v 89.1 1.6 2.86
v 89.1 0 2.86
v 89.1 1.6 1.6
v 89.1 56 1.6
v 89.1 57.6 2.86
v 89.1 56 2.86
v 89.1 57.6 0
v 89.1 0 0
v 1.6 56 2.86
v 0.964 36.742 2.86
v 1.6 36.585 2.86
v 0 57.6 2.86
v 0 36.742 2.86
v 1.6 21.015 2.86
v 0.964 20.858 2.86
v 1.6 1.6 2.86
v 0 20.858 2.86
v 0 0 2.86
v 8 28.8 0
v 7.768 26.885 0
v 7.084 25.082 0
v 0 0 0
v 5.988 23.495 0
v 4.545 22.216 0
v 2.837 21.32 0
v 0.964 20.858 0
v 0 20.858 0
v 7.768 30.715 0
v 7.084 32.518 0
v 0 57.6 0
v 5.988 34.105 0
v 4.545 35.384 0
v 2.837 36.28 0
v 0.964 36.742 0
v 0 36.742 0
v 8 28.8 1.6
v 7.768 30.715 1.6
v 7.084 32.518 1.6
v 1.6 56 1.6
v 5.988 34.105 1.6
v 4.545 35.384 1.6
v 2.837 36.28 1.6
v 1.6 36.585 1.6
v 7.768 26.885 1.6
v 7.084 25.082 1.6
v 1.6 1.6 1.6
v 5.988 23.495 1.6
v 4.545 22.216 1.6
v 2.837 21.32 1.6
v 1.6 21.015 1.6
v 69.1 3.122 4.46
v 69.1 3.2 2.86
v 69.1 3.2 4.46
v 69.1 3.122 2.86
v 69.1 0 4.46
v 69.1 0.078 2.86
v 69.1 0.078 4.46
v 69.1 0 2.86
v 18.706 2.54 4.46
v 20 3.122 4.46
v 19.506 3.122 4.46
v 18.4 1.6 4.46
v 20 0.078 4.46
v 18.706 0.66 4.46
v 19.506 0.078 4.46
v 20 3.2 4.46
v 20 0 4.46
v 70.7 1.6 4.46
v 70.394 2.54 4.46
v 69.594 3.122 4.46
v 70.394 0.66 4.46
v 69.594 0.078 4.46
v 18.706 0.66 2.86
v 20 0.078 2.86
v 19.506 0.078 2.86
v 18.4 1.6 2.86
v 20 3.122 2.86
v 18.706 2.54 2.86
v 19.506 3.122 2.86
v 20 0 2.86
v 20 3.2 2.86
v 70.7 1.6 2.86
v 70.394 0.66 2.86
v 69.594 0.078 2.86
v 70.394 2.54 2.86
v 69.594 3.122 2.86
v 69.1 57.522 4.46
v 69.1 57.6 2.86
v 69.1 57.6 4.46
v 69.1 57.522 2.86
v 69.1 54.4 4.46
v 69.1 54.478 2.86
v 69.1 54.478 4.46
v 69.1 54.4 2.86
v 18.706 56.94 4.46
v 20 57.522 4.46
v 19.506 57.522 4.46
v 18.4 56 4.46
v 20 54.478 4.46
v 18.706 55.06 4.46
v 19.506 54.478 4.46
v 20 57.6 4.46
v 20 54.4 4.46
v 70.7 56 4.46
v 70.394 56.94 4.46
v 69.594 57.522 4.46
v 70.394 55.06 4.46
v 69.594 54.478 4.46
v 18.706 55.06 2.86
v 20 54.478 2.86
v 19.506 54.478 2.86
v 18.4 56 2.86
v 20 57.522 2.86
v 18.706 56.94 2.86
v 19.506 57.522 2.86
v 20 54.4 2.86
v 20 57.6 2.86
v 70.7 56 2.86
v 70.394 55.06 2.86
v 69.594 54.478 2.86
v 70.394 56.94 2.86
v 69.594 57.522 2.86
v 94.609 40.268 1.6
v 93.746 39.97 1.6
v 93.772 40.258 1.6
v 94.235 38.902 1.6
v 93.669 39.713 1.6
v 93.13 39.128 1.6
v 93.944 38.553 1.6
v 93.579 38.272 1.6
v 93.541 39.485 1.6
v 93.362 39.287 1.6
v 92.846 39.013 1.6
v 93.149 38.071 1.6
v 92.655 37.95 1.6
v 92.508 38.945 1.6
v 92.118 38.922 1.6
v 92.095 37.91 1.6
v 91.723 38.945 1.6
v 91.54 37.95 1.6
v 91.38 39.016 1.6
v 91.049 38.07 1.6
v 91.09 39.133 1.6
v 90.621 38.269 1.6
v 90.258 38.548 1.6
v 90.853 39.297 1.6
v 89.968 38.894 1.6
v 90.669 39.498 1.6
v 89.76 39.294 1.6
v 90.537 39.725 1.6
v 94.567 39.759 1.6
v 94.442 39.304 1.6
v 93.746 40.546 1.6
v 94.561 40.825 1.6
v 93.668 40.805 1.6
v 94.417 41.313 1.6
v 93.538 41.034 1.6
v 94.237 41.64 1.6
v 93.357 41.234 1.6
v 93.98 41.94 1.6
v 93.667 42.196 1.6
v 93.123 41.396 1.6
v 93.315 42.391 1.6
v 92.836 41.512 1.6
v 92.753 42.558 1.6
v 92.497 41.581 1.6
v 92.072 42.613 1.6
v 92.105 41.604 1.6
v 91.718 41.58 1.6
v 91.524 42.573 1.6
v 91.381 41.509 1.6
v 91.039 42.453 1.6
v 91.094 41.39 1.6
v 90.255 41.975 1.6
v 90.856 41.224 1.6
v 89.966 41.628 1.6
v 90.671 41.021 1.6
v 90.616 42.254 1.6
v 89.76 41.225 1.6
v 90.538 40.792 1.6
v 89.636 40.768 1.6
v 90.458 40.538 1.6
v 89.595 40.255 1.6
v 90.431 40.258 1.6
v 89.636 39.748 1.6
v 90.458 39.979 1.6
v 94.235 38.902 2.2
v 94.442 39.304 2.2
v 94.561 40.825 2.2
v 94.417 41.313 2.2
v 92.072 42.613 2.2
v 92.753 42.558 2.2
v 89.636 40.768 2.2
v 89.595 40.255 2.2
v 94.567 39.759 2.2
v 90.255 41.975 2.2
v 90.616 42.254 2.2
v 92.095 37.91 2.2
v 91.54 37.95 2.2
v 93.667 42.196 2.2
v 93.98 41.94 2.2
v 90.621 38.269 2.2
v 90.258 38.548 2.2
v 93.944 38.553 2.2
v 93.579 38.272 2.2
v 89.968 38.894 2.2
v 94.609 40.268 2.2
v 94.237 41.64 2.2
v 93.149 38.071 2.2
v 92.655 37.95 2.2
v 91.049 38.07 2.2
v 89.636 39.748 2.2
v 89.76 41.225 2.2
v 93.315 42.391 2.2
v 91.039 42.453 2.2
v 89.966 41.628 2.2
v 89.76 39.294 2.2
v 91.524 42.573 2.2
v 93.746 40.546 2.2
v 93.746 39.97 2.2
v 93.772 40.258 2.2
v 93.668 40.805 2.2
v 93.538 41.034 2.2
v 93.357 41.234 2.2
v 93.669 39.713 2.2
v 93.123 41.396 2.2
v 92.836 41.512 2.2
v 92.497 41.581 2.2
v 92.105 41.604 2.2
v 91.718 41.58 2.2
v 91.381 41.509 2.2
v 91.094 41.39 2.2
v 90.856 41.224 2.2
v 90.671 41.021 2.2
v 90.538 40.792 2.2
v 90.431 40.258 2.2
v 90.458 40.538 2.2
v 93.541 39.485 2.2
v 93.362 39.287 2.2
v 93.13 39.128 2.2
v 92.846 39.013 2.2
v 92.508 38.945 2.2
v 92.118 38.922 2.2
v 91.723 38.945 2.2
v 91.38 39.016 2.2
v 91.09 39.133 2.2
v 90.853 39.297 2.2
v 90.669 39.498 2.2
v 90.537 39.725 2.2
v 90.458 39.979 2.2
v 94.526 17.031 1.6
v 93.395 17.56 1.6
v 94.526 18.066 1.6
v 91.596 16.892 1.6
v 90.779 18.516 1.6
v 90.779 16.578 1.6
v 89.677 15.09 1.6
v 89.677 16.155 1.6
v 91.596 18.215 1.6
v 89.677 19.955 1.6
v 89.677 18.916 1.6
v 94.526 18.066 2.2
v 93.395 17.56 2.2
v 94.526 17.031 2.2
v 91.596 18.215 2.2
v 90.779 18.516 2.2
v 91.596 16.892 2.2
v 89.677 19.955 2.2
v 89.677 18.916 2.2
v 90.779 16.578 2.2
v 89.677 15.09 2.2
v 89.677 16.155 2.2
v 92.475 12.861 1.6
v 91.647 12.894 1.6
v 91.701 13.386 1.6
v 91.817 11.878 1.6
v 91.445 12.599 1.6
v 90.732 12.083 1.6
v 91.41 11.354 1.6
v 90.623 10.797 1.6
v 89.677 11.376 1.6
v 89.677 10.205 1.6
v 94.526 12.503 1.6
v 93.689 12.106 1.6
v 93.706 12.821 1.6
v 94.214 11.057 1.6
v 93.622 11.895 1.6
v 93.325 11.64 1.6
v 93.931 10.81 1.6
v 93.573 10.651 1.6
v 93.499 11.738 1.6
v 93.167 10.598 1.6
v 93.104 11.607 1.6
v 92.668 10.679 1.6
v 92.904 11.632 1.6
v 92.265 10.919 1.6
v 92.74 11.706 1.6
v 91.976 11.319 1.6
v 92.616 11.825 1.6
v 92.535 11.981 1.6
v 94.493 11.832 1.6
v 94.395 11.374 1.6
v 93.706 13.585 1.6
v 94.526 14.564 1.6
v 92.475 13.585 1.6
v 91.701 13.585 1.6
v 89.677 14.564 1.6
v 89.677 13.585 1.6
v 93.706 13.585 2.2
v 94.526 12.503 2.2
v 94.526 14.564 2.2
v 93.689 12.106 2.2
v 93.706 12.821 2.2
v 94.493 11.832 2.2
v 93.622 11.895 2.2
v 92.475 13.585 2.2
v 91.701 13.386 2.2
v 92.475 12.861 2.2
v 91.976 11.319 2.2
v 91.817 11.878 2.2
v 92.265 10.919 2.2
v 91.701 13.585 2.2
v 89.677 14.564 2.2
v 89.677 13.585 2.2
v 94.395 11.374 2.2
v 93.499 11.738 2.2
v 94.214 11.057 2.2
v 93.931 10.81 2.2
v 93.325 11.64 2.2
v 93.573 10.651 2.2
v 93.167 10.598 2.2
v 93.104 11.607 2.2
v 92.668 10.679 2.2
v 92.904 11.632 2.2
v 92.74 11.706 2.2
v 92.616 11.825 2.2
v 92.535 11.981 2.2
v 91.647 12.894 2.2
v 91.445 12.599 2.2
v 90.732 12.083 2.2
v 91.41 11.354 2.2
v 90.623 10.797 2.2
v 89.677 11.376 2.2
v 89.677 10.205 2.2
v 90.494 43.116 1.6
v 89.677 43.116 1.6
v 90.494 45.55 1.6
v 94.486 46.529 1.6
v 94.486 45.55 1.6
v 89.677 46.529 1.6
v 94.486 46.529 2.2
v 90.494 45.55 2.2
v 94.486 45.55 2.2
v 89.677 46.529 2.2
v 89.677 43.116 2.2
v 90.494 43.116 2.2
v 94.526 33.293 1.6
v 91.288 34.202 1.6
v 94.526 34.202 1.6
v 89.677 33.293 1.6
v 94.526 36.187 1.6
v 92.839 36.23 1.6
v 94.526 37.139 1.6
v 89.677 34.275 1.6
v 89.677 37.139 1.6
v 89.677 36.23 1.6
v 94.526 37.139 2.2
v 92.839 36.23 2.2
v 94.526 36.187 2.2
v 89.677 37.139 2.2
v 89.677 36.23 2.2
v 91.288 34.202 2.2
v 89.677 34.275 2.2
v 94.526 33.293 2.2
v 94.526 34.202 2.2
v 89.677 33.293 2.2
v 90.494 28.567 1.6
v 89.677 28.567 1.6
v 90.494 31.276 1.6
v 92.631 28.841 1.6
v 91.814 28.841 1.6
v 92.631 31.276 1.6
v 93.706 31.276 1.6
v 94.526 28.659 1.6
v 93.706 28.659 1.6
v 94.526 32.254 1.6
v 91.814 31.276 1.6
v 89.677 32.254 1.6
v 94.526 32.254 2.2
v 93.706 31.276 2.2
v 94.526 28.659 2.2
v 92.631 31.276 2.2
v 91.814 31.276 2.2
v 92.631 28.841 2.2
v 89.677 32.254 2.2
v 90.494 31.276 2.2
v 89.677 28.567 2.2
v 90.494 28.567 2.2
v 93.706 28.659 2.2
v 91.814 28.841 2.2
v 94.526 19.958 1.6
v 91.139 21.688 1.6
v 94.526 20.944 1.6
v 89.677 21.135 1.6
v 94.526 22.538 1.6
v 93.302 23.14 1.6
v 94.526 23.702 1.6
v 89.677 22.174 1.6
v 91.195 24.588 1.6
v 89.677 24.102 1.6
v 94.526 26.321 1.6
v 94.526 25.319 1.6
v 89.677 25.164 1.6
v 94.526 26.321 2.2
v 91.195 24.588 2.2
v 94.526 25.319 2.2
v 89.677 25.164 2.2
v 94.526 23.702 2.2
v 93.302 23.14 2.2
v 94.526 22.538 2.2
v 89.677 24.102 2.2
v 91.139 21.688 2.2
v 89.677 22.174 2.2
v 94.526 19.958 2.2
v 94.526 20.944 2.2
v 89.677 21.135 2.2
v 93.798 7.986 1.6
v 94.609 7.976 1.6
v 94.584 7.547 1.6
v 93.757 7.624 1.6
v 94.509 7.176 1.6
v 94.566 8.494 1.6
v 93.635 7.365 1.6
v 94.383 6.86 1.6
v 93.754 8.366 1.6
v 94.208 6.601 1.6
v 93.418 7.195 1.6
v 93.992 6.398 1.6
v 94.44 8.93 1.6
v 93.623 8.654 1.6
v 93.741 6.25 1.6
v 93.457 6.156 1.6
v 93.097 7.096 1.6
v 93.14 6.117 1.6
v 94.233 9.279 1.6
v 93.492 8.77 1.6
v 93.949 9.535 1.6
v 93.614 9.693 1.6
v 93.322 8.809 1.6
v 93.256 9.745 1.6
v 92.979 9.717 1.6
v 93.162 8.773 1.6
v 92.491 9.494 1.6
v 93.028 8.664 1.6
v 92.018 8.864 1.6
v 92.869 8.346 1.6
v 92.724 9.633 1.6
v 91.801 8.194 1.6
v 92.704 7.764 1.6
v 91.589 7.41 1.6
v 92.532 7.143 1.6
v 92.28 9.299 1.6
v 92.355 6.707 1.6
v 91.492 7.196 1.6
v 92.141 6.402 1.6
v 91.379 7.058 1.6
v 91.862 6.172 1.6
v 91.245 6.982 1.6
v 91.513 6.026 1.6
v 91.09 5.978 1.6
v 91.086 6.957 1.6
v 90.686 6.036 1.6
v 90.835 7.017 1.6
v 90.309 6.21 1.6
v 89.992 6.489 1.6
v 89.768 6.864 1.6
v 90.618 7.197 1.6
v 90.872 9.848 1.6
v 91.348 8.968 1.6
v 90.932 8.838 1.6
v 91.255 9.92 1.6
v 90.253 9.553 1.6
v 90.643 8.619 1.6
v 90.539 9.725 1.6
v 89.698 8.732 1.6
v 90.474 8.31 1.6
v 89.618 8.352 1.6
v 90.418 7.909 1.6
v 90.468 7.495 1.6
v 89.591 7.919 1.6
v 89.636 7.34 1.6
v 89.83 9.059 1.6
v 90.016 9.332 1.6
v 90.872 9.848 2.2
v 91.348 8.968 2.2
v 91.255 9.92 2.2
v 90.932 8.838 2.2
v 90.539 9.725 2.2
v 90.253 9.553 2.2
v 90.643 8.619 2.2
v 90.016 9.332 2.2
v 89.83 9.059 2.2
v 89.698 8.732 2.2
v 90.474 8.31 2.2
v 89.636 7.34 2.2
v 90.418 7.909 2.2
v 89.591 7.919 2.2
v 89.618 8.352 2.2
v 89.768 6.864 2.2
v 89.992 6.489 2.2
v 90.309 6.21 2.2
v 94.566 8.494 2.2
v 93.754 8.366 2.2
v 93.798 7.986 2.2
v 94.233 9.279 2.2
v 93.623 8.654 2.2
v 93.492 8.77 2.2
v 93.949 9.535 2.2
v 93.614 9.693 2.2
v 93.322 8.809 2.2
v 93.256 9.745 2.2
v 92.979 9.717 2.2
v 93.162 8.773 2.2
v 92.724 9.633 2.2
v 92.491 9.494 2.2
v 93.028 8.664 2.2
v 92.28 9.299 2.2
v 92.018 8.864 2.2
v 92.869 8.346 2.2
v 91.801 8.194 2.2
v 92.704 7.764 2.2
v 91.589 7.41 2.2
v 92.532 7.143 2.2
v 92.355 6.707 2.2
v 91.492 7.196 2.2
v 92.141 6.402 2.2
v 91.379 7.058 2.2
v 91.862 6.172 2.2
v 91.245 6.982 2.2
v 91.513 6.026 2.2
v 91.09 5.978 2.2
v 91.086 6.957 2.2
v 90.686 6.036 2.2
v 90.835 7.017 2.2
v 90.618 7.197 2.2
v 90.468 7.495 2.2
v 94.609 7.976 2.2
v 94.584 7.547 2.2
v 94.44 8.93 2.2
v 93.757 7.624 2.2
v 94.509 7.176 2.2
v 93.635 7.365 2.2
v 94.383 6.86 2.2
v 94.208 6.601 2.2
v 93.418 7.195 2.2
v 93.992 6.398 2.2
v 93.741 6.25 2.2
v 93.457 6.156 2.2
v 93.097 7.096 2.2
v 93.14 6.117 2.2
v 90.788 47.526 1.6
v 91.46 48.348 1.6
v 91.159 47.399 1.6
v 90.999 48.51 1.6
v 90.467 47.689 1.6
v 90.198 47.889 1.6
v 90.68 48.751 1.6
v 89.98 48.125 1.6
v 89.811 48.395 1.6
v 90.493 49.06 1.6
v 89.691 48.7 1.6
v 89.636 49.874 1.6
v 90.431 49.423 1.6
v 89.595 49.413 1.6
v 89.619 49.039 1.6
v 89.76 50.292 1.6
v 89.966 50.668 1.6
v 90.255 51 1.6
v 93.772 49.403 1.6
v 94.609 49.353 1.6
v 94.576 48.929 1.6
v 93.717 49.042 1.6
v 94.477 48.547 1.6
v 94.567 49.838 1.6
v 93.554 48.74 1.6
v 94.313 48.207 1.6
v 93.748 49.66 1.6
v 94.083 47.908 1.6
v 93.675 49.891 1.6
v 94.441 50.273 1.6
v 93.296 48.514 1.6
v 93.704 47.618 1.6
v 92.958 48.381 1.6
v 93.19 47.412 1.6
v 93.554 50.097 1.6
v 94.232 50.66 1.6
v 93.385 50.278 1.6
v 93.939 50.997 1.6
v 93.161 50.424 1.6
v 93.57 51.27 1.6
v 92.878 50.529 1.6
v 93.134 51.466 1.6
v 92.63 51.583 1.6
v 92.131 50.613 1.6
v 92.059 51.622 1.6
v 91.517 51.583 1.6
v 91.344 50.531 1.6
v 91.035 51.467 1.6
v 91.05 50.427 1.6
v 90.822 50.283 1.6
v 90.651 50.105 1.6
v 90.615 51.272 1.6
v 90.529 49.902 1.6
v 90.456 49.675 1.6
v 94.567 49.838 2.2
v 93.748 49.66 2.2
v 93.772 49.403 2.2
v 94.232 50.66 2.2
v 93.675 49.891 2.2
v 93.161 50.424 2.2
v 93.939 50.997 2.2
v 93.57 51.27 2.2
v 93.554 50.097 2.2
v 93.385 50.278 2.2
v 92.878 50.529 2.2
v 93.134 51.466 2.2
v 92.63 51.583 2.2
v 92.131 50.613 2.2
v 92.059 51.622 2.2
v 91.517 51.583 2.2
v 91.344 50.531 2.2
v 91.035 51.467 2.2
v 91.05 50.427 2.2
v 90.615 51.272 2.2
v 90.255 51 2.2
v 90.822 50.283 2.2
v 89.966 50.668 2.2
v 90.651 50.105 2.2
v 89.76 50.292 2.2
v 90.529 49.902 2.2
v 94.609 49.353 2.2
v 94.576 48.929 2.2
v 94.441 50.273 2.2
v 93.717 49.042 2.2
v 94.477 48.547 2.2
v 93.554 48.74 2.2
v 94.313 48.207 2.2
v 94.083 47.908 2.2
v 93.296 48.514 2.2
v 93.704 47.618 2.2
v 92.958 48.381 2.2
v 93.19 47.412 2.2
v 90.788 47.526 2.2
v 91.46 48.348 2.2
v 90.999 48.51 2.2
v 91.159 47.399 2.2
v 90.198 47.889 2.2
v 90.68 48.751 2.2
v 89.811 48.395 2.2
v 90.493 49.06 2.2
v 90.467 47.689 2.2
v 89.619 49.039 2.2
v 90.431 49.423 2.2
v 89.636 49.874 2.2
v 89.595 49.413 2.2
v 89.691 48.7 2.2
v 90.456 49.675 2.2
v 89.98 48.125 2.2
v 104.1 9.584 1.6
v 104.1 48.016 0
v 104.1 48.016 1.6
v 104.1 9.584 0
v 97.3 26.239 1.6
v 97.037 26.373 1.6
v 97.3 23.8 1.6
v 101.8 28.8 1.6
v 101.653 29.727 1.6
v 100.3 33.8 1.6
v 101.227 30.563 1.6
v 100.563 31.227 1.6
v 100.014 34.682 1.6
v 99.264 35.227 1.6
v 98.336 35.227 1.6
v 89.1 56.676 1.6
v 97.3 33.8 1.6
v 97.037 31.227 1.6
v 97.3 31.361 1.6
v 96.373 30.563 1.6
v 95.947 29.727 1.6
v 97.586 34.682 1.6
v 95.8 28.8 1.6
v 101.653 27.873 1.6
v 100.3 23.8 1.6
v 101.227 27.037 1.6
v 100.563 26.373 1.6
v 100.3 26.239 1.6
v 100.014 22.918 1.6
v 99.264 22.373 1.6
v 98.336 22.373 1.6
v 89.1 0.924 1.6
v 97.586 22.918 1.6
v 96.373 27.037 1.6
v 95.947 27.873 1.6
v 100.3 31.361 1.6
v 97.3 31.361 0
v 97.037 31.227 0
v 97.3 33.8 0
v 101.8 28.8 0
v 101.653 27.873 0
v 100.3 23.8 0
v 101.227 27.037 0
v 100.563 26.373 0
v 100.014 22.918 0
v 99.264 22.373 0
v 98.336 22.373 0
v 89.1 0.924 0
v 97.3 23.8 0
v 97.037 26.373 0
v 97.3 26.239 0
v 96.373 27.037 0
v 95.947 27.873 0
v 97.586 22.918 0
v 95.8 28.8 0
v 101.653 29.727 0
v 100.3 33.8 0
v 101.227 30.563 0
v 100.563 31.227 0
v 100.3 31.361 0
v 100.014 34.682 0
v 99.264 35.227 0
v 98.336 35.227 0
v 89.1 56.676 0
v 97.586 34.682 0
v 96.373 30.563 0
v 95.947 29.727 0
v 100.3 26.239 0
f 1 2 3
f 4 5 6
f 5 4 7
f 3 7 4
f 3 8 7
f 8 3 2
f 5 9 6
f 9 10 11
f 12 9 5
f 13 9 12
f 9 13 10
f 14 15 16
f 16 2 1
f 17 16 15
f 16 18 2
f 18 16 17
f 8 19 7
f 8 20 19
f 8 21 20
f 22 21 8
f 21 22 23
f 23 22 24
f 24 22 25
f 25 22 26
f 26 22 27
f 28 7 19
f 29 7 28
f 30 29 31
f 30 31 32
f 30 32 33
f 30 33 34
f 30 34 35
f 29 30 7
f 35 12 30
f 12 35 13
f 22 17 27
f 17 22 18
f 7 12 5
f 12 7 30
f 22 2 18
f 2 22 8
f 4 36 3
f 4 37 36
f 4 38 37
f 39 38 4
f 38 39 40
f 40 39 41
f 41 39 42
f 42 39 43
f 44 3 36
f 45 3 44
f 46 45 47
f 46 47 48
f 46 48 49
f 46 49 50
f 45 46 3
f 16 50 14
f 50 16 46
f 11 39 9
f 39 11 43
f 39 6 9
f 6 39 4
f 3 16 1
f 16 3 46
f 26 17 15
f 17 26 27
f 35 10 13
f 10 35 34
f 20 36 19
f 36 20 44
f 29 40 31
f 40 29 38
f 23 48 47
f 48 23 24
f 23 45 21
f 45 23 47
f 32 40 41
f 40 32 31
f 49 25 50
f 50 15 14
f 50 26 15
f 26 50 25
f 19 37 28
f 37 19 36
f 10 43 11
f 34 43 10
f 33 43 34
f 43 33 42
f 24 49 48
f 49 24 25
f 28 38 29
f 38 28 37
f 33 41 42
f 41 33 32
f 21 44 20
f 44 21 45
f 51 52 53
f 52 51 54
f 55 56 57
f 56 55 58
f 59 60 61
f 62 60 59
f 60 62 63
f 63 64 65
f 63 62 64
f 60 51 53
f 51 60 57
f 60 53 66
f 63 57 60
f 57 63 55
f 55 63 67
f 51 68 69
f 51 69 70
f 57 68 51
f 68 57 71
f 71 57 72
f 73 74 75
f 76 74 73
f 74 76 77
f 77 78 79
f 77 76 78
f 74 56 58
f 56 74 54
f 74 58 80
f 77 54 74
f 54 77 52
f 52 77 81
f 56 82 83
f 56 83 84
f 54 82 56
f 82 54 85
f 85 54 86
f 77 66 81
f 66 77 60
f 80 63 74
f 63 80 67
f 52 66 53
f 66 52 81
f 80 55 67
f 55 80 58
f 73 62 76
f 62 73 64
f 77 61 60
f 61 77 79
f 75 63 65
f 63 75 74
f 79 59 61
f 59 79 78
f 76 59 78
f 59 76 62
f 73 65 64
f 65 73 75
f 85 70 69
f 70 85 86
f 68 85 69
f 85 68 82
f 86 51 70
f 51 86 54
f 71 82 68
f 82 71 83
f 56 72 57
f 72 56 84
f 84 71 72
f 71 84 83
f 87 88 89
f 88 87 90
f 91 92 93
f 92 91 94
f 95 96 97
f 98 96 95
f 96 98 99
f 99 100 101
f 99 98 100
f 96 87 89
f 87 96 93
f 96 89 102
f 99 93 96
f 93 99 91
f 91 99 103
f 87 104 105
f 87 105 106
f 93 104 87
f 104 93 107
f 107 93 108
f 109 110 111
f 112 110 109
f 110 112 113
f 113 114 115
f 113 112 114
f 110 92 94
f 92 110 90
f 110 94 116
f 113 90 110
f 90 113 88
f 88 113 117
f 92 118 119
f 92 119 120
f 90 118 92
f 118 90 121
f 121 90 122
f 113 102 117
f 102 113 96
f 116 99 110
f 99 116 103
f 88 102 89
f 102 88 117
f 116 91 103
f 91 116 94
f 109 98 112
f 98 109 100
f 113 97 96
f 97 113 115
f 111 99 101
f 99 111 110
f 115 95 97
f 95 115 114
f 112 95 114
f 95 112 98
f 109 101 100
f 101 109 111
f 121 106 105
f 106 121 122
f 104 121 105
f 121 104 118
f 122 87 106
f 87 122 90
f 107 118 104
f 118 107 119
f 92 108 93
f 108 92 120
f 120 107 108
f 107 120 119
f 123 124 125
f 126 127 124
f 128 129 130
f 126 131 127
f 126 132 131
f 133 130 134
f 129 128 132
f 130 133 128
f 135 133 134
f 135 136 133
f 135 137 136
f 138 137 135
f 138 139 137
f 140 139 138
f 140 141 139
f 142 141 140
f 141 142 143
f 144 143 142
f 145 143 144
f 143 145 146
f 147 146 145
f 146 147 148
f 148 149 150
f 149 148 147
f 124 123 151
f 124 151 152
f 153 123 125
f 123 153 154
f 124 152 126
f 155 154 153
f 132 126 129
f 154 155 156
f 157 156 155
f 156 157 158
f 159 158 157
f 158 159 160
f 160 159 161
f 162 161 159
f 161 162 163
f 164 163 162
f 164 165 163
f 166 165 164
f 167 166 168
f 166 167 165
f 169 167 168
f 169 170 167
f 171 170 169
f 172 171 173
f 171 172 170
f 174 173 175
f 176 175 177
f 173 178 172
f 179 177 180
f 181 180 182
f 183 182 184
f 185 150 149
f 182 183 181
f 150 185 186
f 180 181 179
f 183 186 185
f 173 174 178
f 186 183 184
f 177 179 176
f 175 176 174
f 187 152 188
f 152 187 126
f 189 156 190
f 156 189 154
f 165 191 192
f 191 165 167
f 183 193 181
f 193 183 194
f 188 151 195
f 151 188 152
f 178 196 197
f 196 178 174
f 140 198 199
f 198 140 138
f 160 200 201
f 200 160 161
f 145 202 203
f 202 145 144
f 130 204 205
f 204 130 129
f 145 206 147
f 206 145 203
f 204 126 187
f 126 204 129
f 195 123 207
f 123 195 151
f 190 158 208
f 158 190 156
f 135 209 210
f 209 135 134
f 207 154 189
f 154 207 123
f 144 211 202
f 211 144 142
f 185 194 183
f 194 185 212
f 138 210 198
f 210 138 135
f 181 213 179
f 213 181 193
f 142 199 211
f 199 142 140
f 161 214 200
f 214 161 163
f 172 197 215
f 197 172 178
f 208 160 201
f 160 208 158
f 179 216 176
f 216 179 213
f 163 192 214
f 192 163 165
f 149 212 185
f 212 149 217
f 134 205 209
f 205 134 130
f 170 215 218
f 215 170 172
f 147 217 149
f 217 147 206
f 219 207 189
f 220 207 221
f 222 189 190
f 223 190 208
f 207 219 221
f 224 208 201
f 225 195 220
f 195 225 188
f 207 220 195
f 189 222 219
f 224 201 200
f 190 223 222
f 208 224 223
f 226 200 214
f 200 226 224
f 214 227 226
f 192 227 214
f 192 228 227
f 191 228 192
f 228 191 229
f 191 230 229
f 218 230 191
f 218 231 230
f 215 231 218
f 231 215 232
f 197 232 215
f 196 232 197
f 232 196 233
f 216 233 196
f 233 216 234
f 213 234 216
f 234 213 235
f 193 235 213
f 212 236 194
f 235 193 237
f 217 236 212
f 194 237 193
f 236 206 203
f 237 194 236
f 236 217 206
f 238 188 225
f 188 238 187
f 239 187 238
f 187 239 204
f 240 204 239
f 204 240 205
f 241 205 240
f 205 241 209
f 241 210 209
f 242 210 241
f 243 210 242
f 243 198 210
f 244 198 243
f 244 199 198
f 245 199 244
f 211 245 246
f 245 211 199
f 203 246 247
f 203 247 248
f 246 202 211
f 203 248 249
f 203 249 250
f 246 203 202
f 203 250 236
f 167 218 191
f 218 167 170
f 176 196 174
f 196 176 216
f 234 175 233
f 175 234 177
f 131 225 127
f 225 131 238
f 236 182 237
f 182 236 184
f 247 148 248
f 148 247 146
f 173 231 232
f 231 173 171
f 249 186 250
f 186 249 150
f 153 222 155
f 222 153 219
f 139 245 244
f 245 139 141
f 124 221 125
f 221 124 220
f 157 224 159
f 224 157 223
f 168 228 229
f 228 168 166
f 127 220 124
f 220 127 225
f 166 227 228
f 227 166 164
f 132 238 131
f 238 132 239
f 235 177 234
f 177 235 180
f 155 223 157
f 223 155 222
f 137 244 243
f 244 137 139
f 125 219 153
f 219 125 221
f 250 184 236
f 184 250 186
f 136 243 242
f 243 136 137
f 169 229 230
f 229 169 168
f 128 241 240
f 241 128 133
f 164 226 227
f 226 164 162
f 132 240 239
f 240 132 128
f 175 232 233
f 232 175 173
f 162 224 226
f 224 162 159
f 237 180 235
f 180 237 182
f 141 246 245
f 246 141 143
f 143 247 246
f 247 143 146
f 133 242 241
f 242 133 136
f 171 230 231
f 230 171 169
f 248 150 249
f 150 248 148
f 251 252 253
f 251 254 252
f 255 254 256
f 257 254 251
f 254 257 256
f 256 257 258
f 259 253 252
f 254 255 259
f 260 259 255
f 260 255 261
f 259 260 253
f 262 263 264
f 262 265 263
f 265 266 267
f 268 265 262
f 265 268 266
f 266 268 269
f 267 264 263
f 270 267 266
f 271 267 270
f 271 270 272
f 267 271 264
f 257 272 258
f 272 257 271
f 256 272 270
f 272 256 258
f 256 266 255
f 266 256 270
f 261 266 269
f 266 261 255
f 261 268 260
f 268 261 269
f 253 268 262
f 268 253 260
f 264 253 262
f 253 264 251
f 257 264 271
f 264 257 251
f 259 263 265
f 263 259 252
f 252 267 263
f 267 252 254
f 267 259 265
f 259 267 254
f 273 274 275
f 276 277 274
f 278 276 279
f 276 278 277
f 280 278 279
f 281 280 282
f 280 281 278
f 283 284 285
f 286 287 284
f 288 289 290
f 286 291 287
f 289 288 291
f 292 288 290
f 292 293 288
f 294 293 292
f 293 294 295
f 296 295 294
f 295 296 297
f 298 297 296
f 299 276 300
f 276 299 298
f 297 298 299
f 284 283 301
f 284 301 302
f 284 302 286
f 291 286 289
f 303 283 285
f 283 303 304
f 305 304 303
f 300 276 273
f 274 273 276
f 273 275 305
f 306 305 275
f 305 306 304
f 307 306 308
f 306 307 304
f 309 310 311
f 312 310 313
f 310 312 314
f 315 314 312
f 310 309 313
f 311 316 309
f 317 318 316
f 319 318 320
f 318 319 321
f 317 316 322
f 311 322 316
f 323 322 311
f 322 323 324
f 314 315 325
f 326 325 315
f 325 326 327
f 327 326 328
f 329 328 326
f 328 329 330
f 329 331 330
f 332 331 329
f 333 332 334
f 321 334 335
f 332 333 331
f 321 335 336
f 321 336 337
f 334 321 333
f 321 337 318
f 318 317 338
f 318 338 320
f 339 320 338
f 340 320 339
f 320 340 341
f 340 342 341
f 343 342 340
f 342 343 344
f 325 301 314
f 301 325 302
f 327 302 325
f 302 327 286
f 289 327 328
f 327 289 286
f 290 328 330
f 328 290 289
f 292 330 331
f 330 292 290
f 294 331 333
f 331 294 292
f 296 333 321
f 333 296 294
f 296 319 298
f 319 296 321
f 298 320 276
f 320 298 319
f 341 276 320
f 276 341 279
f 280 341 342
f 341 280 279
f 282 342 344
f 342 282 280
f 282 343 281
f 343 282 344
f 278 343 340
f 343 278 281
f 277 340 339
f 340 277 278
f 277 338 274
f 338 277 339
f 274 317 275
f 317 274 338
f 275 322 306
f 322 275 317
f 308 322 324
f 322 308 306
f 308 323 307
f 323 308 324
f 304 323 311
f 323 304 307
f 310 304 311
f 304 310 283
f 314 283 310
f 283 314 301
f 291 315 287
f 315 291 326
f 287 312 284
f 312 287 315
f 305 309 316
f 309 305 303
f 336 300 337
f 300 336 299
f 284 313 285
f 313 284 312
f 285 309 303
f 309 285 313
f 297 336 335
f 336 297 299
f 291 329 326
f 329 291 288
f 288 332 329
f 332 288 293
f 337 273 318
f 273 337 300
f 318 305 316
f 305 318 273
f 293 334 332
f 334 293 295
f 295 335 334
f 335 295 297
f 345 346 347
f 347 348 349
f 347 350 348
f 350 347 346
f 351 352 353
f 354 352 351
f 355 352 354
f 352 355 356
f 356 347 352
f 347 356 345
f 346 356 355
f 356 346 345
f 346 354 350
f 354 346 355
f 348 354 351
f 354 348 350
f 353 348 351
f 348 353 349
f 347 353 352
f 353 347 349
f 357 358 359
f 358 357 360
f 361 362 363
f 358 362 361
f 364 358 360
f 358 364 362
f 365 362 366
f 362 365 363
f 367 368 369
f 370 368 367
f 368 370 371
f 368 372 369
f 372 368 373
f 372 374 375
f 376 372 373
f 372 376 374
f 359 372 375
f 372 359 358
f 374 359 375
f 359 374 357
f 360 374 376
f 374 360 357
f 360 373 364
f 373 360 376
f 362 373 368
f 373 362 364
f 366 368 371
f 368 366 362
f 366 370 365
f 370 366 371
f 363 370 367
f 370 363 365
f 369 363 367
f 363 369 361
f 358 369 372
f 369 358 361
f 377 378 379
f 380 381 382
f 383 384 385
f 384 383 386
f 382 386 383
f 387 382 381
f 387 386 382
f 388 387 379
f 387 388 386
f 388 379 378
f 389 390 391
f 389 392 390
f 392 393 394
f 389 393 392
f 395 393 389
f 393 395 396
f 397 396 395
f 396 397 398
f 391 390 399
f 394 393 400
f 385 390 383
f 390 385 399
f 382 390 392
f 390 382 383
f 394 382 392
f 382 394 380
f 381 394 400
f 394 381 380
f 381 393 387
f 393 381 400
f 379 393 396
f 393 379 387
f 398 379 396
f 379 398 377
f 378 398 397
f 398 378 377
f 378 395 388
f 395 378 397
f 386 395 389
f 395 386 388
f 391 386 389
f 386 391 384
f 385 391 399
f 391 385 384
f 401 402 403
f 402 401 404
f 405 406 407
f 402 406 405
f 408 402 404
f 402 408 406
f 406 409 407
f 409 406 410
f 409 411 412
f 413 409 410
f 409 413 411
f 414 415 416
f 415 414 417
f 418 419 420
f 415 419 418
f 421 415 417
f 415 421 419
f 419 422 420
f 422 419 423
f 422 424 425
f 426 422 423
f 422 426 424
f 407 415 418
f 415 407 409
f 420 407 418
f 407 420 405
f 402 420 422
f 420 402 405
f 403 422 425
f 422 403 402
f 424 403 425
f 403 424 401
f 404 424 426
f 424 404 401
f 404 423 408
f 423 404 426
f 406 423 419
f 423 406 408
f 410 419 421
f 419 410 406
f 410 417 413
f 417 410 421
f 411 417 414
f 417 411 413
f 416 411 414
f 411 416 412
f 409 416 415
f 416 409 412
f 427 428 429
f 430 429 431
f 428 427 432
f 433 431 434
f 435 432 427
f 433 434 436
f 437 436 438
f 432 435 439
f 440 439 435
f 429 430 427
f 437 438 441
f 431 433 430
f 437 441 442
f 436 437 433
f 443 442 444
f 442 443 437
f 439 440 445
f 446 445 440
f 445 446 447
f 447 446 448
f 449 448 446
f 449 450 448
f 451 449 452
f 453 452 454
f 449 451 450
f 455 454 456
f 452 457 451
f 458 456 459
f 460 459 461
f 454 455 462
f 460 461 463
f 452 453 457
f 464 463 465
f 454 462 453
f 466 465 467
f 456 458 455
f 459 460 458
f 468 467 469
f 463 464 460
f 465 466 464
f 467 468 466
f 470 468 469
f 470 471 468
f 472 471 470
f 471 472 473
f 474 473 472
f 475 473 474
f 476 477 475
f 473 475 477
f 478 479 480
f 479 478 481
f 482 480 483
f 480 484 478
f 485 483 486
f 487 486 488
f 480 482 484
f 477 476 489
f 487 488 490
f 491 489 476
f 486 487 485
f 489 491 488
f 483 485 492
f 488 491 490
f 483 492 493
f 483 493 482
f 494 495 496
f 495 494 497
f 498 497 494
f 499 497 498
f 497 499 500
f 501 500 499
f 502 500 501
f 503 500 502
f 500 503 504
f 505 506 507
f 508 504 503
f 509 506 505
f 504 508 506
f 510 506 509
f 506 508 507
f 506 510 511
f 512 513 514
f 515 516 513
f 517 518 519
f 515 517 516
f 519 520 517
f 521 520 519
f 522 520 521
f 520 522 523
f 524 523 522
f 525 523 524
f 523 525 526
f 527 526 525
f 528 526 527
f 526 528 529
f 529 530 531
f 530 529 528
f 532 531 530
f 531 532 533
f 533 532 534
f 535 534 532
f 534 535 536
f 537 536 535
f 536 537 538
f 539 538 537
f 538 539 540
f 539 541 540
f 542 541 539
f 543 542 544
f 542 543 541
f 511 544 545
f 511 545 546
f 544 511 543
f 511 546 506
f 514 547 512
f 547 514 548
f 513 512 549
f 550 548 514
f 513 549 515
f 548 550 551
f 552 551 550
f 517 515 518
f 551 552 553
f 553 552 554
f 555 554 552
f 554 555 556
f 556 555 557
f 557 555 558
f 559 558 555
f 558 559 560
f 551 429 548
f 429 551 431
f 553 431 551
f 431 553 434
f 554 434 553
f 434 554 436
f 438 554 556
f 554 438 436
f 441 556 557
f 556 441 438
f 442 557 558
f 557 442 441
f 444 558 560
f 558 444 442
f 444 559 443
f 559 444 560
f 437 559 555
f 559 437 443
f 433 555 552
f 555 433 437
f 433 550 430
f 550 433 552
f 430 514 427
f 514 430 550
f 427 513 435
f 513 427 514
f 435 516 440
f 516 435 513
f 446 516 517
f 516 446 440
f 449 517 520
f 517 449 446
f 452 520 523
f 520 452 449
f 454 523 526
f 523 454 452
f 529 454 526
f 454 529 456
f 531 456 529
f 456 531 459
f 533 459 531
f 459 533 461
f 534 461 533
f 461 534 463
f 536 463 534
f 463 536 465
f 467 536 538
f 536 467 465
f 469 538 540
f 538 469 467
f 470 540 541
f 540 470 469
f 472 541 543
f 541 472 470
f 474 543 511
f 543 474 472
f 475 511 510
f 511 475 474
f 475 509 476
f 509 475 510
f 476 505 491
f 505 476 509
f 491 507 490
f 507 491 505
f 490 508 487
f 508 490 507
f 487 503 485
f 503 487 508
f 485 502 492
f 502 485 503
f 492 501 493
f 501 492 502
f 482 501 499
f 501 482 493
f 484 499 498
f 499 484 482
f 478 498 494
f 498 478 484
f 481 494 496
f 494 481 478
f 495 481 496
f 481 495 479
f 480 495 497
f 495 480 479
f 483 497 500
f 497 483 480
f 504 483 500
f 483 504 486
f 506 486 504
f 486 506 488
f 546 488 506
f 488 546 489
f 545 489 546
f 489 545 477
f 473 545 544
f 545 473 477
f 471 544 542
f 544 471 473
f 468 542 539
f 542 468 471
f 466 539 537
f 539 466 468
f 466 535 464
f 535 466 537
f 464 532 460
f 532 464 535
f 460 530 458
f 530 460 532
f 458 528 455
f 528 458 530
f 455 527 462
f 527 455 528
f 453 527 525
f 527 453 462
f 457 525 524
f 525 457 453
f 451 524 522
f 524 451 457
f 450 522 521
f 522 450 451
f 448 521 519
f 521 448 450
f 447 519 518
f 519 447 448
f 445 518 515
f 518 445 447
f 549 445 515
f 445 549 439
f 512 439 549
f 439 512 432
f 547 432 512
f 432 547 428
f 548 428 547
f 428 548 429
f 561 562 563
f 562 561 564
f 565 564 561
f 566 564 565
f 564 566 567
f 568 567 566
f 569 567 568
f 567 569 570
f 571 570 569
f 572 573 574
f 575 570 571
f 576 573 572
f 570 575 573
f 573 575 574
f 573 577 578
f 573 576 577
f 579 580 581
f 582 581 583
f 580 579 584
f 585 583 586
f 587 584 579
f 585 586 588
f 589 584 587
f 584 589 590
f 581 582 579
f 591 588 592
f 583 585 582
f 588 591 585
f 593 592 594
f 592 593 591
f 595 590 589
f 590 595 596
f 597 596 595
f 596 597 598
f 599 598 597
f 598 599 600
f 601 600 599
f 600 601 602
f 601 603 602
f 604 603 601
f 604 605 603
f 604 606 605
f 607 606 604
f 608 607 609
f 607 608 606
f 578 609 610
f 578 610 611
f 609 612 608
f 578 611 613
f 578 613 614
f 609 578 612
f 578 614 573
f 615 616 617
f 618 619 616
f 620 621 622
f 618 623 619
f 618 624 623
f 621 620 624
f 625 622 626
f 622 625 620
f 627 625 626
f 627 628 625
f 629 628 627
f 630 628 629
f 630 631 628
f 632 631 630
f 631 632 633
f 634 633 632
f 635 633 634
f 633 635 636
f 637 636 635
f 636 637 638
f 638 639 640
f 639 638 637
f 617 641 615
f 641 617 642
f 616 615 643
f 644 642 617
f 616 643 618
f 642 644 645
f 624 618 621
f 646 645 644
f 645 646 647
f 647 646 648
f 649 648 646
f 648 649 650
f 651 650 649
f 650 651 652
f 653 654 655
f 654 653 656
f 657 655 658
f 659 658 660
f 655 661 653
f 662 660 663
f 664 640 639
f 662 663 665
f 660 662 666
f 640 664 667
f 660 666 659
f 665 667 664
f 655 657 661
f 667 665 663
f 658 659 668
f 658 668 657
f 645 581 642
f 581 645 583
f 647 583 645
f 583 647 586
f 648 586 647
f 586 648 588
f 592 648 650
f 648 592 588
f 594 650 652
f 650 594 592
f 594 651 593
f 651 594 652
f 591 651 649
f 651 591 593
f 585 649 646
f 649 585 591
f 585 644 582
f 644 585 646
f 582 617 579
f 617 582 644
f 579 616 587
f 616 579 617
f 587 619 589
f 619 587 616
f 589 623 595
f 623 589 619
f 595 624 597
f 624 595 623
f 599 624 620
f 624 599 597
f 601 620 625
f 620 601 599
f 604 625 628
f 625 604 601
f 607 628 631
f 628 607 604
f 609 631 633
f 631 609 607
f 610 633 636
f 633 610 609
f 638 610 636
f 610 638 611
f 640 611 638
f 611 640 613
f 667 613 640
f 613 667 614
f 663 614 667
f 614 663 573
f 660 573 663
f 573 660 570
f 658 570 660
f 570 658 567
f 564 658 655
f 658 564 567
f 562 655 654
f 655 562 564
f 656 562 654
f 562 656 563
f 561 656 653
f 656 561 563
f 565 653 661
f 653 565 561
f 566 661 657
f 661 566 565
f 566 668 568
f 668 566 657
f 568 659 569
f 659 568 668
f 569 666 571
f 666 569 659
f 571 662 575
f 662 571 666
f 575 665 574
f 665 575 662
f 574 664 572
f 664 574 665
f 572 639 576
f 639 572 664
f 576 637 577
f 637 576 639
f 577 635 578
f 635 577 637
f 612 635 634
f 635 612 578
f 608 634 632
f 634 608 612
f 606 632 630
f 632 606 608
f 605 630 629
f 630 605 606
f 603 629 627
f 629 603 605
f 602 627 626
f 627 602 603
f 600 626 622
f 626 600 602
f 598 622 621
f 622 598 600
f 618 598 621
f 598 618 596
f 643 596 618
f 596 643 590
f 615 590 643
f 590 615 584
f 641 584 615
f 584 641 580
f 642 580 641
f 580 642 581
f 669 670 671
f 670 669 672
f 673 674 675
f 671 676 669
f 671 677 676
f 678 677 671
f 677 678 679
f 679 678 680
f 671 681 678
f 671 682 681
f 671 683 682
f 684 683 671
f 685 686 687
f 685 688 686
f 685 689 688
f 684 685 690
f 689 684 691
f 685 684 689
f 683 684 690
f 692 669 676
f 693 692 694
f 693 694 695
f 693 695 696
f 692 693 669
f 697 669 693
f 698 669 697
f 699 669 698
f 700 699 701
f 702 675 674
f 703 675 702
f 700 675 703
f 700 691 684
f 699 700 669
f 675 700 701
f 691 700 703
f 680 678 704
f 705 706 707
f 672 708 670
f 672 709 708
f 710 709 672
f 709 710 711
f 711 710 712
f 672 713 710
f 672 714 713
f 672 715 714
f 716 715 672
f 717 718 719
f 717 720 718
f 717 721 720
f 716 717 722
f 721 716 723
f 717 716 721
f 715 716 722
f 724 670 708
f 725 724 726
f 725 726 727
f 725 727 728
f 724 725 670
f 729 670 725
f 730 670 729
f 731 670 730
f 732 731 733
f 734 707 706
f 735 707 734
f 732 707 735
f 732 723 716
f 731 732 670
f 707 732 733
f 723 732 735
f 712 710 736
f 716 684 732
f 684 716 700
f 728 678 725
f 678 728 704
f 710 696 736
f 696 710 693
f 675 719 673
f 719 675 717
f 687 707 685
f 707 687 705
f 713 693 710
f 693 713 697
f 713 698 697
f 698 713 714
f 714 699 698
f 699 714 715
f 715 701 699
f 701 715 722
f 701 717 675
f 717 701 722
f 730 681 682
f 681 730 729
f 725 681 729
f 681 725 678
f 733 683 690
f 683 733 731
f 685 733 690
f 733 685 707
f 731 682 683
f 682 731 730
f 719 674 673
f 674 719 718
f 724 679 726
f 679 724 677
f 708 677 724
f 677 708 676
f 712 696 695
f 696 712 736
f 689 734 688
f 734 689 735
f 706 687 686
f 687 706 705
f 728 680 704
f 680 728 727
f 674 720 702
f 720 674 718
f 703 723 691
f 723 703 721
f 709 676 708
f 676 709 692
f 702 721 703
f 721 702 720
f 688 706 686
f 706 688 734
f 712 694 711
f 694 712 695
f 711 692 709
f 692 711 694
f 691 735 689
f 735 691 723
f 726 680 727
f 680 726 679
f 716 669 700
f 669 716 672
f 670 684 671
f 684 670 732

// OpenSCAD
// file: RepRapLogo.scad
module repraplogo(h=7)
{
	difference ()
	{
		union(){
			scale ([0.5,0.5,0.5])
				linear_extrude(height=h)
				import("C:/Users/malparti/Documents/GitHub/Clone-wars/logos/clone-wars/repraplogo.dxf");

		}
	}
}
// main file
use <RepRapLogo.scad>
use <reprapleonText.scad> // "leon"
use <CLONEWARSText.scad>  // "clone wars"
use <reprapText.scad>     // "reprap"

cardMarginPer = 0.5;
cardMarginH = 0.5;
cardWidth = 87 + cardMarginPer;
cardLength = 55.5 + cardMarginPer;
cardHight  = 1*0.76 + cardMarginH;

wall = 1.6;

cardHolderW = wall + cardWidth;
cardHolderL = wall + cardLength;
cardHolderH = wall + cardHight;

holderL = 15;

module card ( w, l, h )
{
	cube ( [w, l, h] );
}

module myText (text = "clone wars")
{
	translate ( [3,cardHolderL/2,wall] )
	{
		if (text=="leon") // Leon
		{
			scale ( [0.45, 0.45, 0.3])
				rotate ([0,0,-90])
				{
					poly_path2992(2);
					poly_path2994(2);
					poly_path2996(2);
					poly_path2998(2);
					poly_path3000(2);
					poly_path3002(2);
					poly_path3004(2);
					poly_path3006(2);
					poly_path3008(2);
					poly_path3010(2);
					poly_path2990(2);
					poly_path3012(2);
					poly_path3014(2);
				}
		}
		
		if ( text == "clone wars" )
		{
			#scale ( [0.60, 0.60, 0.3])
				rotate ([0,0,-90])
				{
				
					poly_path3241(2);
					poly_path3243(2);
					poly_path3245(2);
					poly_path3247(2);
					poly_path3249(2);
					poly_path3251(2);
					poly_path3253(2);
					poly_path3255(2);
					poly_path3239(2);
				}
		}
		else // RepRap
		{
			scale ( [0.45, 0.45, 0.3])
				rotate ([0,0,-90])
				{
					poly_path3168(2);
					poly_path3162(2);
					poly_path3170(2);
					poly_path3172(2);
					poly_path3174(2);
					poly_path3176(2);
					poly_path3178(2);
					poly_path3180(2);
					poly_path3182(2);
					poly_path3184(2);
					poly_path3186(2);
					poly_path3160(2);
					poly_path3188(2);
					poly_path3190(2);
					poly_path3166(2);
					poly_path3164(2);
				}
		}
	}
}

module d1CardStrap (text="clone wars")
{
	difference ()
	{
			translate ( [cardHolderW, 0, 0] )
			{
				card ( holderL, cardHolderL, wall );
				myText (text = "clone wars");
				
			}
			//	cutting angles of strap
			translate ( [cardHolderW+holderL, 0, 0] )
			{
				rotate ([0,0,180])
				{
					cylinder ( r=holderL+wall, h=10, $fn=3, center=true );
				}
			}
			translate ( [cardHolderW+holderL, cardHolderL, 0] )
			{
				rotate ([0,0,180])
				{
					cylinder ( r=holderL+wall, h=10, $fn=3, center=true );
				}
			}
		
			// Strap hole
			translate ( [(cardHolderW+(holderL/2)+0.7), cardHolderL/2-5, -1] )
			{
				card (3, 10, 10);
				translate ([1.5,0,-1])
					cylinder ( r=1.5, h=10, $fn=10 );
				translate ([1.5,10,-1])
					cylinder ( r=1.5, h=10, $fn=10 );
				translate ([1.5,5,-5])
					cylinder ( r=3, h=10, , $fn=20 );
			}
	}	
}	

module topStops ()
{
	translate ( [ 20, 0, cardHolderH ] )
	{
		union ()
		{
			card ( cardHolderW - 40, 2*wall,  wall );
			// Round the ends
			translate ( [0, wall, 0] )
				cylinder ( r=wall, h=wall, $fn=10 );
			translate ( [cardHolderW - 40, wall, 0] )
				cylinder ( r=wall, h=wall, $fn=10 );
		}
	}
	translate ( [ 20, cardHolderL-(2*wall), cardHolderH] )
	{
		union ()
		{
			card ( cardHolderW - 40, 2*wall,  wall );
			// Round the ends
			translate ( [0, wall, 0] )
				cylinder ( r=wall, h=wall, $fn=10 );
			translate ( [cardHolderW-40, wall, 0] )
				cylinder ( r=wall, h=wall, $fn=10 );
		}
	}
}

module d1CardHolder ()
{
	union() {
		difference ()
		{
			union (){
				difference ()
				{
					card (cardHolderW, cardHolderL, cardHolderH);
					translate ([wall,wall,wall])
						card (cardHolderW, cardHolderL-2*wall, cardHolderH);
	
					translate ([cardHolderL/3, cardHolderW/1.56, -2])
					{
						rotate ([0,0,270])
							scale ([0.6,0.6,1])
							repraplogo(20);
					}
				}
			}
			// Card extraction
			translate ([0, (cardHolderL)/2, 0])
				cylinder (  h=10, r = 8, center=true);	
	
		}
	
	    // Top overhang
		topStops();
		d1CardStrap(text="reprap");
	}
}

d1CardHolder();
translate ([wall, wall, wall])
{
	*#card ( 86, 54, 0.8 );
}
